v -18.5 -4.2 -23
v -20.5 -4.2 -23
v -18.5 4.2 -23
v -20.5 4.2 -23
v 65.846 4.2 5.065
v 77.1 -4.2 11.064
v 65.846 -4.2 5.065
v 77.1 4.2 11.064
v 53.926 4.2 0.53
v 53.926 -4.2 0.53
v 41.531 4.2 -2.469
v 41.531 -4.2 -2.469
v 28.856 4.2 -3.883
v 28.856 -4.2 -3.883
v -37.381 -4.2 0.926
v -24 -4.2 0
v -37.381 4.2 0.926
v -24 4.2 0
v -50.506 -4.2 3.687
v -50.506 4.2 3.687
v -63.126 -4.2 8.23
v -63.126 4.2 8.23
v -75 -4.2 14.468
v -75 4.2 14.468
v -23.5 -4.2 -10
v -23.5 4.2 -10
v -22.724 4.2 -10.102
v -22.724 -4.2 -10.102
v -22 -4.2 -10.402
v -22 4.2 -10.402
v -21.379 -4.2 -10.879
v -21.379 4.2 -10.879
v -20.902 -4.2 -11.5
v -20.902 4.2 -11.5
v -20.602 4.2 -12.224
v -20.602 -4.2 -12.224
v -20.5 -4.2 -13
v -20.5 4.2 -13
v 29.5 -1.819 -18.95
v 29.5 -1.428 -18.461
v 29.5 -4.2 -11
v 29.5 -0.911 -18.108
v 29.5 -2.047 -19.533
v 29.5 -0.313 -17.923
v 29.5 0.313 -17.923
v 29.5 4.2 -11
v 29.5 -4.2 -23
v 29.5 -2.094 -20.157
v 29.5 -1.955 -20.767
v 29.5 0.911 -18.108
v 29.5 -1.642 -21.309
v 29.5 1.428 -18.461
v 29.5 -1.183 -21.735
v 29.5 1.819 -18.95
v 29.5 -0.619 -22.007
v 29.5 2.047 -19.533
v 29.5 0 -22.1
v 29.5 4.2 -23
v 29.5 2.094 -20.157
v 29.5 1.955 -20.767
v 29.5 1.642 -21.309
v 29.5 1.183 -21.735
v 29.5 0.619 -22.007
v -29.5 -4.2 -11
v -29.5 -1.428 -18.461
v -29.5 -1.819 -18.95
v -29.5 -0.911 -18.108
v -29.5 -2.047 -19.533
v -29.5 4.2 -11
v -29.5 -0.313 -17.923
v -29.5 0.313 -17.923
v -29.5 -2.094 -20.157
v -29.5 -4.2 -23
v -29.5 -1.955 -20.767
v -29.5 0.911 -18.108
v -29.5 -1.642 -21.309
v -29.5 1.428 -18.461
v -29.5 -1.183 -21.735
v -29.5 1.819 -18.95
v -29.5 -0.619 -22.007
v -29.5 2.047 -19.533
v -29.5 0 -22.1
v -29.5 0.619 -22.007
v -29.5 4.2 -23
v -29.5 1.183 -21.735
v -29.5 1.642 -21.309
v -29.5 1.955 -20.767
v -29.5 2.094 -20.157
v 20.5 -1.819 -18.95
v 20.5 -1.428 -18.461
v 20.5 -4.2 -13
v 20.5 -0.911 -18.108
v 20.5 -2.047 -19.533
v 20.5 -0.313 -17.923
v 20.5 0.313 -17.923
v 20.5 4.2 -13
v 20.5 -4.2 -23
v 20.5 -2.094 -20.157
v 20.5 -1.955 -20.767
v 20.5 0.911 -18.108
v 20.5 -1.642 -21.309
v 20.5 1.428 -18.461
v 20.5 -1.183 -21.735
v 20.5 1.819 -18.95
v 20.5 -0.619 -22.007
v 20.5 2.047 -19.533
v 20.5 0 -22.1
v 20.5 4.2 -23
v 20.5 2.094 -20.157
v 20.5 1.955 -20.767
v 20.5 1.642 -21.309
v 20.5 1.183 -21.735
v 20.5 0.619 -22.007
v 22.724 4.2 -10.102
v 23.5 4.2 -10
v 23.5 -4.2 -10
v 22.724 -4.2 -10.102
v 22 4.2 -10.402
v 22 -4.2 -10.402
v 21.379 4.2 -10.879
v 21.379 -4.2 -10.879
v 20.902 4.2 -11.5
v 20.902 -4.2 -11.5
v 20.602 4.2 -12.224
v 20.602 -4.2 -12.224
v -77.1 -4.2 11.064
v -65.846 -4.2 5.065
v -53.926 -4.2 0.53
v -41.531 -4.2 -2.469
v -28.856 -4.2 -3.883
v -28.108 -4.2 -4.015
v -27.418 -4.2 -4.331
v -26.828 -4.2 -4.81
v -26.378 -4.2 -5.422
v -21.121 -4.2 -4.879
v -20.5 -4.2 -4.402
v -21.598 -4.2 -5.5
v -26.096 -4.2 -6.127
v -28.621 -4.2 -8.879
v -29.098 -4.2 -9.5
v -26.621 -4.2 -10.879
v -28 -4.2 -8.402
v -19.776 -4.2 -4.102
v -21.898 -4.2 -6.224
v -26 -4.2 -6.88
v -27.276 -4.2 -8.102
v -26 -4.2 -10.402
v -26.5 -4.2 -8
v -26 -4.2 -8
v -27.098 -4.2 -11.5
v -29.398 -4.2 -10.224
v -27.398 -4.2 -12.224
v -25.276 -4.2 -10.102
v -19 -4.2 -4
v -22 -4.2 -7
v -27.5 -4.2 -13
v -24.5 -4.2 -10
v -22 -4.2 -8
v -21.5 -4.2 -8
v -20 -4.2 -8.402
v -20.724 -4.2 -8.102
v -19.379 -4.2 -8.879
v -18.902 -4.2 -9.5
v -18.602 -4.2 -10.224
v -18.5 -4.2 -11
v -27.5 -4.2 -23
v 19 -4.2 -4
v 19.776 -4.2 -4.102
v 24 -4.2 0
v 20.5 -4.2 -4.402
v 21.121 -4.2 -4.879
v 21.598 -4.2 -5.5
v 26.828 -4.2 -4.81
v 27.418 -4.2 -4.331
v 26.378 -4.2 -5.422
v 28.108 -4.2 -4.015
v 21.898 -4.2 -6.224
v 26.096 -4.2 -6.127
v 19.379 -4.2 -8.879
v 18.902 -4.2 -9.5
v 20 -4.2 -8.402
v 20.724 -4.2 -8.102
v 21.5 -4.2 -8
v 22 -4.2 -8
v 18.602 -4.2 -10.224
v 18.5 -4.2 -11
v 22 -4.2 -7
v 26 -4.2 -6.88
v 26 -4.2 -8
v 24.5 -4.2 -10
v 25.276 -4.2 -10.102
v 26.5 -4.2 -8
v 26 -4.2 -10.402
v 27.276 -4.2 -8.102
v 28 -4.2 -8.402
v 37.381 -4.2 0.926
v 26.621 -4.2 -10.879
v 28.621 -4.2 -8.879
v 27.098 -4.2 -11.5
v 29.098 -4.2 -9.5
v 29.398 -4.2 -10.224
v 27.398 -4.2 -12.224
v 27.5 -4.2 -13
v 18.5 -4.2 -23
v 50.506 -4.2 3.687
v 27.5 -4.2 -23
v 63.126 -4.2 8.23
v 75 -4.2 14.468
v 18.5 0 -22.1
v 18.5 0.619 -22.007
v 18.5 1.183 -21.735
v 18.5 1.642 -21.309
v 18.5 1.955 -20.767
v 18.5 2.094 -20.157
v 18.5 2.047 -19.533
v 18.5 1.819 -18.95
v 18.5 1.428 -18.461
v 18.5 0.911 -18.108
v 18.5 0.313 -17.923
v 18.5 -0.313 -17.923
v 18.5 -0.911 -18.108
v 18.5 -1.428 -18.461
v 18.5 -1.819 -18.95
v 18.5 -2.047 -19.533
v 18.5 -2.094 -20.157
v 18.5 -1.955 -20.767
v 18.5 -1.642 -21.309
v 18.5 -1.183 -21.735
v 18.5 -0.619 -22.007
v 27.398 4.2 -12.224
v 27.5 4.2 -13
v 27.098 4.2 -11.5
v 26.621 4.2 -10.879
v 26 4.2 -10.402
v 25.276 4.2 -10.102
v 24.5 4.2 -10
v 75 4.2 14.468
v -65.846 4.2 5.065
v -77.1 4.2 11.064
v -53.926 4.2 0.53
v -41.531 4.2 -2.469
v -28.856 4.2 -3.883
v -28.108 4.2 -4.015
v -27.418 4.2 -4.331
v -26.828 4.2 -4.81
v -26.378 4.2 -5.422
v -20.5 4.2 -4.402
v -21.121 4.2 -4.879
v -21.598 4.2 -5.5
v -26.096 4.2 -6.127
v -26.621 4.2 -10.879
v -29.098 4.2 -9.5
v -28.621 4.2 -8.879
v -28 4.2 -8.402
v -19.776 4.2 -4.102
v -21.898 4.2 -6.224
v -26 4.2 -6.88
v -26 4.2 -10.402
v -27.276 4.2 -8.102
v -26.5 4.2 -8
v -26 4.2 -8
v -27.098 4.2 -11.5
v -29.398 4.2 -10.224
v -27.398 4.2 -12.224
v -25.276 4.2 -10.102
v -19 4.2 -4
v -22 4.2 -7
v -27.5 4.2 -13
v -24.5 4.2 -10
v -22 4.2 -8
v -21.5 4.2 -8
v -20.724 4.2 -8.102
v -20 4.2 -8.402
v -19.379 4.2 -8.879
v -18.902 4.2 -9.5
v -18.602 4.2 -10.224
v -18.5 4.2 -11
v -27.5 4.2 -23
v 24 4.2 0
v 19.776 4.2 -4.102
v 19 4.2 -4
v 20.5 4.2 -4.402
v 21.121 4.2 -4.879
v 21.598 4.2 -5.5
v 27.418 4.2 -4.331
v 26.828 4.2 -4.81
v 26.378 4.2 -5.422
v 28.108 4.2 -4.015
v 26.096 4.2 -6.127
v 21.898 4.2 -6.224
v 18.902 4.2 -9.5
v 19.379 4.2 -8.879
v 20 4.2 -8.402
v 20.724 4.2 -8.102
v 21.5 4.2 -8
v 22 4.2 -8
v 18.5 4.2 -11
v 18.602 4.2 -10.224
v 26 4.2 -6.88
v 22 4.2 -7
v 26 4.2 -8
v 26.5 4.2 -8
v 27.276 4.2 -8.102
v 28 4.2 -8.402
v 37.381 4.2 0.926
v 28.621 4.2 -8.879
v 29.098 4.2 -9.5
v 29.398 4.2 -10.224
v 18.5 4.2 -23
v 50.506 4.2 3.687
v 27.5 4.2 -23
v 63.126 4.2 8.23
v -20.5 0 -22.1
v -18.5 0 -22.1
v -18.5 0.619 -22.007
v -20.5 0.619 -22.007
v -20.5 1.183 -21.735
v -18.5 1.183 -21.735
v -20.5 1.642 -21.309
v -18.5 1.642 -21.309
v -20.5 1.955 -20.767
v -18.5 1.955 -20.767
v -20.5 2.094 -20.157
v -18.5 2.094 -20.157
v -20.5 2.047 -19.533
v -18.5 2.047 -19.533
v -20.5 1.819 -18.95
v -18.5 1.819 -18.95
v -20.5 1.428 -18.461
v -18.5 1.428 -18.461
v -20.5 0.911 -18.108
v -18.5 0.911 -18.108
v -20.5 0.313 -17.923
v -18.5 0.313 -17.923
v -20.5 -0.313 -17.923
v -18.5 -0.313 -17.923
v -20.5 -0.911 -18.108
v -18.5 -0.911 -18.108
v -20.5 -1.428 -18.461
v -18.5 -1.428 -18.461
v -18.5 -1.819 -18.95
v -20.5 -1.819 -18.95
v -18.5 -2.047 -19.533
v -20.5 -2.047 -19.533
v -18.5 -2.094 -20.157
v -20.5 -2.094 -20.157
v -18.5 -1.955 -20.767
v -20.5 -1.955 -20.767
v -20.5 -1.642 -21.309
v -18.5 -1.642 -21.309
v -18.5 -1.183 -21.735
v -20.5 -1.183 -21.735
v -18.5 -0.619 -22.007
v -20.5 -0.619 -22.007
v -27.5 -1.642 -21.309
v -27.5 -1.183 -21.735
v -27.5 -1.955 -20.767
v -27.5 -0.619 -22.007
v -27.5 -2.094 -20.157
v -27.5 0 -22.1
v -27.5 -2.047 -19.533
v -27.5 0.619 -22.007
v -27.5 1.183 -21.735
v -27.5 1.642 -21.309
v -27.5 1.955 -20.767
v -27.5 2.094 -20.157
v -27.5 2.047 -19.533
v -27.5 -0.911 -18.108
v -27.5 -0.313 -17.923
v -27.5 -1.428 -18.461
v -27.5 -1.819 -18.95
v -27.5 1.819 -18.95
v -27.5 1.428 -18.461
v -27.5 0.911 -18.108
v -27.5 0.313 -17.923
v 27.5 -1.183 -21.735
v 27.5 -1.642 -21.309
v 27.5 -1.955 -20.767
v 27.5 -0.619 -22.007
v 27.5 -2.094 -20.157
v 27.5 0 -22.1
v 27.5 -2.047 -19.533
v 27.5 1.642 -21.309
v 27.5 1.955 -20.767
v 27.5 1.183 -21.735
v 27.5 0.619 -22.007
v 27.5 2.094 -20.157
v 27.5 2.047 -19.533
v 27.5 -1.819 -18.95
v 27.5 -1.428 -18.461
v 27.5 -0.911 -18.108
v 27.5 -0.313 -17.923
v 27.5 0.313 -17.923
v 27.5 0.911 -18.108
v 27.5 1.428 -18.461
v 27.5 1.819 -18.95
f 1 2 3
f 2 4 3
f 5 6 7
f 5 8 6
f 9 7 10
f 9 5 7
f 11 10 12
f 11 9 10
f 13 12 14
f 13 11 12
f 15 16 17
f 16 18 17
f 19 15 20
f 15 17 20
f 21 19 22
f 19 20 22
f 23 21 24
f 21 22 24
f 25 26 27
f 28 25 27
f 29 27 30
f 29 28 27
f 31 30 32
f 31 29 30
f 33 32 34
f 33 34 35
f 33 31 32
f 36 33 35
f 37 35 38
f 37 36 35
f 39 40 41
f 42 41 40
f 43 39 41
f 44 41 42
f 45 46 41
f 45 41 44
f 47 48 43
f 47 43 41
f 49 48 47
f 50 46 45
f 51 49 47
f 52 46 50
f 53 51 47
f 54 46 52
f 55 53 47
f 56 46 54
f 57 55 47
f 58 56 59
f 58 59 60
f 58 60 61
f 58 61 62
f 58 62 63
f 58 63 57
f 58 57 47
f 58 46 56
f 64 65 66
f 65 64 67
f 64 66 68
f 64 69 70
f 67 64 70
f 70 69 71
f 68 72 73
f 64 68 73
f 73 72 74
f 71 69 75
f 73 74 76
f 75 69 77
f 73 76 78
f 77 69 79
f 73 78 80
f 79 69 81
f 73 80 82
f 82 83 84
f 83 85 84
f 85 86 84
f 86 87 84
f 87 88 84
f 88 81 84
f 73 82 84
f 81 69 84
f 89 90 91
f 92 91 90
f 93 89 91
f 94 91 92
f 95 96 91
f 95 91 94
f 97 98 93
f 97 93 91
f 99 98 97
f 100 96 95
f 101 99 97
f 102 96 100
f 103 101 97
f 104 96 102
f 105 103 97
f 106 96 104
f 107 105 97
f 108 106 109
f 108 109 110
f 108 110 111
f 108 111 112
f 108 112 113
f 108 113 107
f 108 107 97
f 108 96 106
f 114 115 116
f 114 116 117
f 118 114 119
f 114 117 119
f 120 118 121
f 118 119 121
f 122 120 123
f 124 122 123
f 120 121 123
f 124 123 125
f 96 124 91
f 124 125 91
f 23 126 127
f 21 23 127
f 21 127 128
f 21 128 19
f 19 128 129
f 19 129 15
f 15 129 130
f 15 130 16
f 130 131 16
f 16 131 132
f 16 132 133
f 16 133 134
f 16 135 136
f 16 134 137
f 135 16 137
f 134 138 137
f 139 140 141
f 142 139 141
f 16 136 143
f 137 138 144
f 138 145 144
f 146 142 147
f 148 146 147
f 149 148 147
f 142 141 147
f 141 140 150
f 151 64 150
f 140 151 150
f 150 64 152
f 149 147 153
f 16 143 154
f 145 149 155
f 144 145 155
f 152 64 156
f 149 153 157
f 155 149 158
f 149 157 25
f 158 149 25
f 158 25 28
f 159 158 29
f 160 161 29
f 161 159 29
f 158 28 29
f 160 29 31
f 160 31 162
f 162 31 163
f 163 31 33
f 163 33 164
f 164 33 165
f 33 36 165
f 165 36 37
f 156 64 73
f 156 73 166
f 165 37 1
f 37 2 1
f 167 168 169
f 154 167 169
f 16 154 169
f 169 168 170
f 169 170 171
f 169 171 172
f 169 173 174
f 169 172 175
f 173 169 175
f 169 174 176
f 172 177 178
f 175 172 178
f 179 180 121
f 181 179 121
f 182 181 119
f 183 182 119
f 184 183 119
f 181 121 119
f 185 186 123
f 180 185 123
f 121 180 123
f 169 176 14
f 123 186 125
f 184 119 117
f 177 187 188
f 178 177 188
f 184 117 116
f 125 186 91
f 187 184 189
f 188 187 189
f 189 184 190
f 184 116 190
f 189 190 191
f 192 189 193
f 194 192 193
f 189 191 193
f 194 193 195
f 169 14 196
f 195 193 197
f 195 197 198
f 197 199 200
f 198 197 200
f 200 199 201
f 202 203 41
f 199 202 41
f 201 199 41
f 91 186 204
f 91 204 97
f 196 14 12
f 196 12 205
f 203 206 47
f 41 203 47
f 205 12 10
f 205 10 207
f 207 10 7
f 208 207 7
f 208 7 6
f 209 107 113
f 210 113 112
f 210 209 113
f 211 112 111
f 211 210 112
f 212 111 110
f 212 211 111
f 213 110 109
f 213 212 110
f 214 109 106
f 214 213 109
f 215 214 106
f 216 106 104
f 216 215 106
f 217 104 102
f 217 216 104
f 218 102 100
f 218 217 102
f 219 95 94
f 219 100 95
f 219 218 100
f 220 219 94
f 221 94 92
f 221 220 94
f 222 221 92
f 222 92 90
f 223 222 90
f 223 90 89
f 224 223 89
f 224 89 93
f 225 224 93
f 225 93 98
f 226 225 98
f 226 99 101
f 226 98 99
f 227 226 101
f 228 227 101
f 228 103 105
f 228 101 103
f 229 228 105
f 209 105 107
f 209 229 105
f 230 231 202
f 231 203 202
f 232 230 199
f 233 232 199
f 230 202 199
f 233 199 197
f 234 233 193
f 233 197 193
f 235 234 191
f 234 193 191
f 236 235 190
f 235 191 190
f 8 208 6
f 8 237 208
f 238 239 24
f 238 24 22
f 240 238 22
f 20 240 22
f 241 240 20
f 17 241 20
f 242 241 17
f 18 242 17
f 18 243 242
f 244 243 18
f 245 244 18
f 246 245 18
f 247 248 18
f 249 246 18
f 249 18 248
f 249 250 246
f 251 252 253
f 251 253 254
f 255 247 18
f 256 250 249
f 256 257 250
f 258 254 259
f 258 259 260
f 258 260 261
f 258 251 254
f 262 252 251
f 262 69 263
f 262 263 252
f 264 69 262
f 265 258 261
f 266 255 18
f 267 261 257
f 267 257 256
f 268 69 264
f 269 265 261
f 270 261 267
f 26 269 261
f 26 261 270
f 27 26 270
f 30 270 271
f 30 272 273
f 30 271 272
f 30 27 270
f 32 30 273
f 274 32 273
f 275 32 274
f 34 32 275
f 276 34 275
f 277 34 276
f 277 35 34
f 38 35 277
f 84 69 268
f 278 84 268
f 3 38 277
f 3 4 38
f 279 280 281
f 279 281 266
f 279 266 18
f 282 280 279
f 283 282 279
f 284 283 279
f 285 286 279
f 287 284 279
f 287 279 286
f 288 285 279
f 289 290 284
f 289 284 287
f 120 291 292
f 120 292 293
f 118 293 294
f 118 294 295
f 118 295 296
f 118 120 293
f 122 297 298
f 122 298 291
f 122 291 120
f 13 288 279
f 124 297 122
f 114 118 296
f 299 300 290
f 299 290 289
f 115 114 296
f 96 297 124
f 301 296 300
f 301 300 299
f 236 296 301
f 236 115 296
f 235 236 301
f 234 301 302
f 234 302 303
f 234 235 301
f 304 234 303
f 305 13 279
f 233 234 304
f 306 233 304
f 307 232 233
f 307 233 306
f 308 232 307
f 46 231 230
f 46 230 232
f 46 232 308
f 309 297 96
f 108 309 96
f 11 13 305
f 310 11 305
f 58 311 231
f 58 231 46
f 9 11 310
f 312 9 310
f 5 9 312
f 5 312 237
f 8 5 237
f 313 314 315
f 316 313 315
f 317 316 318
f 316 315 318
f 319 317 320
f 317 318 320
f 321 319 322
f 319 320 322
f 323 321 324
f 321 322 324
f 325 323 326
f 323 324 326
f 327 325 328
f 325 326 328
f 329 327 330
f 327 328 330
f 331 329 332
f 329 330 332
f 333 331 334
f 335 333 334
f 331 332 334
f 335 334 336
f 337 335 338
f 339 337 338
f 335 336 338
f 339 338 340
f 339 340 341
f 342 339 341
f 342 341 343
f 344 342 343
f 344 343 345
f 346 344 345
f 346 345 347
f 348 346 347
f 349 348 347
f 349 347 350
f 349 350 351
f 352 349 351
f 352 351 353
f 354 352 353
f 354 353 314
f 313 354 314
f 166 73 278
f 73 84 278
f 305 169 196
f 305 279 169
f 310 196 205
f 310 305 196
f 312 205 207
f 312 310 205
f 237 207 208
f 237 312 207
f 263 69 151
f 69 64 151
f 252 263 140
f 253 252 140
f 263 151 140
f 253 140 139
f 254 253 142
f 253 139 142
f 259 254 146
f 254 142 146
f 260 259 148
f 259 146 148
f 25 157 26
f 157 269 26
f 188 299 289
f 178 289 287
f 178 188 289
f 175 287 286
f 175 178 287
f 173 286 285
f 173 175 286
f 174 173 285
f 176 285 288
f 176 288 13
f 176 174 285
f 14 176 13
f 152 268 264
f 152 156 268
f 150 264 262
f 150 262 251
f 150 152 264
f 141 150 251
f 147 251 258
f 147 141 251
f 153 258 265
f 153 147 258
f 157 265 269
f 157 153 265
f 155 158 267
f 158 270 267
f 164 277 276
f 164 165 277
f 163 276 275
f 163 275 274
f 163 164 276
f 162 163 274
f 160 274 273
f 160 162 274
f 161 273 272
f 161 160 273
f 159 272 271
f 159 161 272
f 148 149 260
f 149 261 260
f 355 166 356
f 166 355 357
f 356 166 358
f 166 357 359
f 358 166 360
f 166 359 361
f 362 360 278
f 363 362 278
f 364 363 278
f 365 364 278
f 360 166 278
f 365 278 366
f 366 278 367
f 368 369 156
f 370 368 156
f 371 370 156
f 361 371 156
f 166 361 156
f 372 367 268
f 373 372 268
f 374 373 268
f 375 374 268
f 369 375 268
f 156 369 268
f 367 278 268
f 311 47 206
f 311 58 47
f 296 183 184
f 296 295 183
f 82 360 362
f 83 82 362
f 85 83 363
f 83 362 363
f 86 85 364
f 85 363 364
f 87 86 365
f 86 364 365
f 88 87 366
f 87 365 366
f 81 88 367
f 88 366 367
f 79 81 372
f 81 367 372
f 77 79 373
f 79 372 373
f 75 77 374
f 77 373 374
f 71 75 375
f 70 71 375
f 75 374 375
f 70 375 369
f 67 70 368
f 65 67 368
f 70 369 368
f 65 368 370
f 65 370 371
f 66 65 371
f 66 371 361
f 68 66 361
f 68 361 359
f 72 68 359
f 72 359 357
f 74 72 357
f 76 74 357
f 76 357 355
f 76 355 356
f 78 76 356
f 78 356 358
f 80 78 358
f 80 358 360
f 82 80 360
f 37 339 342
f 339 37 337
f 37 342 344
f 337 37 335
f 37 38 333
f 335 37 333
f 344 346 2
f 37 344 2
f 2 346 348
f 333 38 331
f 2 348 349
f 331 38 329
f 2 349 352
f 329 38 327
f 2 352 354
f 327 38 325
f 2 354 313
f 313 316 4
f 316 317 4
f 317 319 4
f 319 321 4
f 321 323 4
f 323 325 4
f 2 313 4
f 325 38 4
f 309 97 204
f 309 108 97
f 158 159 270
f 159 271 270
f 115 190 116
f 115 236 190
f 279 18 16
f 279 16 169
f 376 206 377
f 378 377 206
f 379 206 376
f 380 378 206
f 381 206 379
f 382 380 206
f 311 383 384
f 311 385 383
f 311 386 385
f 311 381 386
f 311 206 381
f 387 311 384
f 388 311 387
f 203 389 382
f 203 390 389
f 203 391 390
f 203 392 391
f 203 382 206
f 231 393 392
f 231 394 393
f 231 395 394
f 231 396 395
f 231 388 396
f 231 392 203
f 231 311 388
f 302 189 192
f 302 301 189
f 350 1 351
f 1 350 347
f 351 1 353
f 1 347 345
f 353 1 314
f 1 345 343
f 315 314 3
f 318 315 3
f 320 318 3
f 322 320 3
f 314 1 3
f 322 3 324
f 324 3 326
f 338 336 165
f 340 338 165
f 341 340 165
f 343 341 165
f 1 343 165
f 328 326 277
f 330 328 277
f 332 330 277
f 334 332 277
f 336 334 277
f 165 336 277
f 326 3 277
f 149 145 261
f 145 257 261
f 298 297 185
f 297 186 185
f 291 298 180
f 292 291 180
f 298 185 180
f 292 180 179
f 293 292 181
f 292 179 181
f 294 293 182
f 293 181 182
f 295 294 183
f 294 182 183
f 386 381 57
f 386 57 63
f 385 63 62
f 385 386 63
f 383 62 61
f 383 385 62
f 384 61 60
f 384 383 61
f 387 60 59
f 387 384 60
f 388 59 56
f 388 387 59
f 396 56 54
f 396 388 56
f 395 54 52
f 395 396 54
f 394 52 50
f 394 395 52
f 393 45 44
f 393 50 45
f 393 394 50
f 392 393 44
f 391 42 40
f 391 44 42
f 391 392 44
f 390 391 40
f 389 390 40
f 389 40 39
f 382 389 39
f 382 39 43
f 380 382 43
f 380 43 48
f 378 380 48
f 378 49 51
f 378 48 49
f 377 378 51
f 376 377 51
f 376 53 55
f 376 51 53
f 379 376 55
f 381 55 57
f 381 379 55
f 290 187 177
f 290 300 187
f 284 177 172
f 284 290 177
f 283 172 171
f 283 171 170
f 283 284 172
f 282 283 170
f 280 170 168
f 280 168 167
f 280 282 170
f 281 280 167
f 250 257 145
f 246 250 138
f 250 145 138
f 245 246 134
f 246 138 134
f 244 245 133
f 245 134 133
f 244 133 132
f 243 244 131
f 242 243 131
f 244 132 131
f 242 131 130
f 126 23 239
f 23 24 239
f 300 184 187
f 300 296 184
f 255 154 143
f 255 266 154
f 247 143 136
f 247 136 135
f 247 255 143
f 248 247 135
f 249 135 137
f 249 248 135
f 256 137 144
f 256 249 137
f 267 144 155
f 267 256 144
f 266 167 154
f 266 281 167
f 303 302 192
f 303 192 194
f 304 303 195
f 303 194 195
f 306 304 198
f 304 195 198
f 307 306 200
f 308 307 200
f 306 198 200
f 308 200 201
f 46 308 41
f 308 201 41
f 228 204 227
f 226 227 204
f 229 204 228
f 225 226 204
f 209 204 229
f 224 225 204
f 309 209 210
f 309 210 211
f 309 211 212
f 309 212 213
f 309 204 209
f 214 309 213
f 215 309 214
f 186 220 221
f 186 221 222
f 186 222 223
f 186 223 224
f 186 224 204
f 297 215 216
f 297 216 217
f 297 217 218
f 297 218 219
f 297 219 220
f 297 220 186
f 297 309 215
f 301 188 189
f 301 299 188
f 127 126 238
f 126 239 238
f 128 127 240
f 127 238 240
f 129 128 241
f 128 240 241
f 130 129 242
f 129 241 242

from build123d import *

# Parameters (mm, degrees)
BOSS_EXTRUDE1_DEPTH  = 4.2
FILLET2_R            = 3
FILLET5_R            = 3
SKETCH3_R            = 2.1
CUT_EXTRUDE1_DEPTH   = 16
FILLET6_R            = 3
FILLET2_OF_MIRROR1_R = 3
FILLET5_OF_MIRROR1_R = 3
FILLET6_OF_MIRROR1_R = 3


with BuildPart() as part:
    # Sketch2 → Boss-Extrude1 (new body, symmetric)
    with BuildSketch(Plane(origin=(0, 0, 0), x_dir=(1, 0, 0), z_dir=(0, 1, 0))):
        with BuildLine():
            Line((0, 0), (-24, 0))
            ThreePointArc((-24, 0), (-50.506230897, -3.686965816), (-75, -14.467933694))
            Line((-75, -14.467933694), (-77.100442165, -11.063797576))
            ThreePointArc((-77.100442165, -11.063797576), (-52.558629139, -0.11650046), (-26, 3.980220055))
            Line((-26, 3.980220055), (-26, 8))
            Line((-26, 8), (-29.5, 8))
            Line((-29.5, 8), (-29.5, 23))
            Line((-29.5, 23), (-27.5, 23))
            Line((-27.5, 23), (-27.5, 10))
            Line((-27.5, 10), (-24, 10))
            Line((-24, 10), (-20.5, 10))
            Line((-20.5, 10), (-20.5, 23))
            Line((-20.5, 23), (-18.5, 23))
            Line((-18.5, 23), (-18.5, 8))
            Line((-18.5, 8), (-22, 8))
            Line((-22, 8), (-22, 4))
            Line((-22, 4), (0, 4))
            Line((0, 4), (0, 0))
        make_face()
    boss_extrude1 = extrude(amount=BOSS_EXTRUDE1_DEPTH, both=True)

    # Fillet2
    fillet2_edges = [part.edges().sort_by_distance(p)[0] for p in [
        (-29.5, 0, -8),
    ]]
    fillet(fillet2_edges, radius=FILLET2_R)

    # Fillet5
    fillet5_edges = [part.edges().sort_by_distance(p)[0] for p in [
        (-26, 0, -3.980220055),
        (-18.5, 0, -8),
        (-22, 0, -4),
    ]]
    fillet(fillet5_edges, radius=FILLET5_R)

    # Sketch3 → Cut-Extrude1 (cut)
    with BuildSketch(Plane(origin=(-18.5, 0, 0), x_dir=(0, 0, -1), z_dir=(1, 0, 0))):
        with Locations((20, 0)):
            Circle(SKETCH3_R)
    cut_extrude1 = extrude(amount=-CUT_EXTRUDE1_DEPTH, mode=Mode.SUBTRACT)

    # Fillet6
    fillet6_edges = [part.edges().sort_by_distance(p)[0] for p in [
        (-27.5, 0, -10),
        (-20.5, 0, -10),
    ]]
    fillet(fillet6_edges, radius=FILLET6_R)

    # Mirror1: Boss-Extrude1, Cut-Extrude1 across plane
    add(boss_extrude1.mirror(Plane(origin=(0, -4.2, -4), x_dir=(0, 0, 1), z_dir=(1, 0, 0))))
    add(cut_extrude1.mirror(Plane(origin=(0, -4.2, -4), x_dir=(0, 0, 1), z_dir=(1, 0, 0))), mode=Mode.SUBTRACT)

    # Fillet2 of Mirror1
    fillet2_of_mirror1_edges = [part.edges().sort_by_distance(p)[0] for p in [
        (29.5, 0, -8),
    ]]
    fillet(fillet2_of_mirror1_edges, radius=FILLET2_OF_MIRROR1_R)

    # Fillet5 of Mirror1
    fillet5_of_mirror1_edges = [part.edges().sort_by_distance(p)[0] for p in [
        (26, 0, -3.980220055),
        (18.5, 0, -8),
        (22, 0, -4),
    ]]
    fillet(fillet5_of_mirror1_edges, radius=FILLET5_OF_MIRROR1_R)

    # Fillet6 of Mirror1
    fillet6_of_mirror1_edges = [part.edges().sort_by_distance(p)[0] for p in [
        (27.5, 0, -10),
        (20.5, 0, -10),
    ]]
    fillet(fillet6_of_mirror1_edges, radius=FILLET6_OF_MIRROR1_R)


solid = part.part
